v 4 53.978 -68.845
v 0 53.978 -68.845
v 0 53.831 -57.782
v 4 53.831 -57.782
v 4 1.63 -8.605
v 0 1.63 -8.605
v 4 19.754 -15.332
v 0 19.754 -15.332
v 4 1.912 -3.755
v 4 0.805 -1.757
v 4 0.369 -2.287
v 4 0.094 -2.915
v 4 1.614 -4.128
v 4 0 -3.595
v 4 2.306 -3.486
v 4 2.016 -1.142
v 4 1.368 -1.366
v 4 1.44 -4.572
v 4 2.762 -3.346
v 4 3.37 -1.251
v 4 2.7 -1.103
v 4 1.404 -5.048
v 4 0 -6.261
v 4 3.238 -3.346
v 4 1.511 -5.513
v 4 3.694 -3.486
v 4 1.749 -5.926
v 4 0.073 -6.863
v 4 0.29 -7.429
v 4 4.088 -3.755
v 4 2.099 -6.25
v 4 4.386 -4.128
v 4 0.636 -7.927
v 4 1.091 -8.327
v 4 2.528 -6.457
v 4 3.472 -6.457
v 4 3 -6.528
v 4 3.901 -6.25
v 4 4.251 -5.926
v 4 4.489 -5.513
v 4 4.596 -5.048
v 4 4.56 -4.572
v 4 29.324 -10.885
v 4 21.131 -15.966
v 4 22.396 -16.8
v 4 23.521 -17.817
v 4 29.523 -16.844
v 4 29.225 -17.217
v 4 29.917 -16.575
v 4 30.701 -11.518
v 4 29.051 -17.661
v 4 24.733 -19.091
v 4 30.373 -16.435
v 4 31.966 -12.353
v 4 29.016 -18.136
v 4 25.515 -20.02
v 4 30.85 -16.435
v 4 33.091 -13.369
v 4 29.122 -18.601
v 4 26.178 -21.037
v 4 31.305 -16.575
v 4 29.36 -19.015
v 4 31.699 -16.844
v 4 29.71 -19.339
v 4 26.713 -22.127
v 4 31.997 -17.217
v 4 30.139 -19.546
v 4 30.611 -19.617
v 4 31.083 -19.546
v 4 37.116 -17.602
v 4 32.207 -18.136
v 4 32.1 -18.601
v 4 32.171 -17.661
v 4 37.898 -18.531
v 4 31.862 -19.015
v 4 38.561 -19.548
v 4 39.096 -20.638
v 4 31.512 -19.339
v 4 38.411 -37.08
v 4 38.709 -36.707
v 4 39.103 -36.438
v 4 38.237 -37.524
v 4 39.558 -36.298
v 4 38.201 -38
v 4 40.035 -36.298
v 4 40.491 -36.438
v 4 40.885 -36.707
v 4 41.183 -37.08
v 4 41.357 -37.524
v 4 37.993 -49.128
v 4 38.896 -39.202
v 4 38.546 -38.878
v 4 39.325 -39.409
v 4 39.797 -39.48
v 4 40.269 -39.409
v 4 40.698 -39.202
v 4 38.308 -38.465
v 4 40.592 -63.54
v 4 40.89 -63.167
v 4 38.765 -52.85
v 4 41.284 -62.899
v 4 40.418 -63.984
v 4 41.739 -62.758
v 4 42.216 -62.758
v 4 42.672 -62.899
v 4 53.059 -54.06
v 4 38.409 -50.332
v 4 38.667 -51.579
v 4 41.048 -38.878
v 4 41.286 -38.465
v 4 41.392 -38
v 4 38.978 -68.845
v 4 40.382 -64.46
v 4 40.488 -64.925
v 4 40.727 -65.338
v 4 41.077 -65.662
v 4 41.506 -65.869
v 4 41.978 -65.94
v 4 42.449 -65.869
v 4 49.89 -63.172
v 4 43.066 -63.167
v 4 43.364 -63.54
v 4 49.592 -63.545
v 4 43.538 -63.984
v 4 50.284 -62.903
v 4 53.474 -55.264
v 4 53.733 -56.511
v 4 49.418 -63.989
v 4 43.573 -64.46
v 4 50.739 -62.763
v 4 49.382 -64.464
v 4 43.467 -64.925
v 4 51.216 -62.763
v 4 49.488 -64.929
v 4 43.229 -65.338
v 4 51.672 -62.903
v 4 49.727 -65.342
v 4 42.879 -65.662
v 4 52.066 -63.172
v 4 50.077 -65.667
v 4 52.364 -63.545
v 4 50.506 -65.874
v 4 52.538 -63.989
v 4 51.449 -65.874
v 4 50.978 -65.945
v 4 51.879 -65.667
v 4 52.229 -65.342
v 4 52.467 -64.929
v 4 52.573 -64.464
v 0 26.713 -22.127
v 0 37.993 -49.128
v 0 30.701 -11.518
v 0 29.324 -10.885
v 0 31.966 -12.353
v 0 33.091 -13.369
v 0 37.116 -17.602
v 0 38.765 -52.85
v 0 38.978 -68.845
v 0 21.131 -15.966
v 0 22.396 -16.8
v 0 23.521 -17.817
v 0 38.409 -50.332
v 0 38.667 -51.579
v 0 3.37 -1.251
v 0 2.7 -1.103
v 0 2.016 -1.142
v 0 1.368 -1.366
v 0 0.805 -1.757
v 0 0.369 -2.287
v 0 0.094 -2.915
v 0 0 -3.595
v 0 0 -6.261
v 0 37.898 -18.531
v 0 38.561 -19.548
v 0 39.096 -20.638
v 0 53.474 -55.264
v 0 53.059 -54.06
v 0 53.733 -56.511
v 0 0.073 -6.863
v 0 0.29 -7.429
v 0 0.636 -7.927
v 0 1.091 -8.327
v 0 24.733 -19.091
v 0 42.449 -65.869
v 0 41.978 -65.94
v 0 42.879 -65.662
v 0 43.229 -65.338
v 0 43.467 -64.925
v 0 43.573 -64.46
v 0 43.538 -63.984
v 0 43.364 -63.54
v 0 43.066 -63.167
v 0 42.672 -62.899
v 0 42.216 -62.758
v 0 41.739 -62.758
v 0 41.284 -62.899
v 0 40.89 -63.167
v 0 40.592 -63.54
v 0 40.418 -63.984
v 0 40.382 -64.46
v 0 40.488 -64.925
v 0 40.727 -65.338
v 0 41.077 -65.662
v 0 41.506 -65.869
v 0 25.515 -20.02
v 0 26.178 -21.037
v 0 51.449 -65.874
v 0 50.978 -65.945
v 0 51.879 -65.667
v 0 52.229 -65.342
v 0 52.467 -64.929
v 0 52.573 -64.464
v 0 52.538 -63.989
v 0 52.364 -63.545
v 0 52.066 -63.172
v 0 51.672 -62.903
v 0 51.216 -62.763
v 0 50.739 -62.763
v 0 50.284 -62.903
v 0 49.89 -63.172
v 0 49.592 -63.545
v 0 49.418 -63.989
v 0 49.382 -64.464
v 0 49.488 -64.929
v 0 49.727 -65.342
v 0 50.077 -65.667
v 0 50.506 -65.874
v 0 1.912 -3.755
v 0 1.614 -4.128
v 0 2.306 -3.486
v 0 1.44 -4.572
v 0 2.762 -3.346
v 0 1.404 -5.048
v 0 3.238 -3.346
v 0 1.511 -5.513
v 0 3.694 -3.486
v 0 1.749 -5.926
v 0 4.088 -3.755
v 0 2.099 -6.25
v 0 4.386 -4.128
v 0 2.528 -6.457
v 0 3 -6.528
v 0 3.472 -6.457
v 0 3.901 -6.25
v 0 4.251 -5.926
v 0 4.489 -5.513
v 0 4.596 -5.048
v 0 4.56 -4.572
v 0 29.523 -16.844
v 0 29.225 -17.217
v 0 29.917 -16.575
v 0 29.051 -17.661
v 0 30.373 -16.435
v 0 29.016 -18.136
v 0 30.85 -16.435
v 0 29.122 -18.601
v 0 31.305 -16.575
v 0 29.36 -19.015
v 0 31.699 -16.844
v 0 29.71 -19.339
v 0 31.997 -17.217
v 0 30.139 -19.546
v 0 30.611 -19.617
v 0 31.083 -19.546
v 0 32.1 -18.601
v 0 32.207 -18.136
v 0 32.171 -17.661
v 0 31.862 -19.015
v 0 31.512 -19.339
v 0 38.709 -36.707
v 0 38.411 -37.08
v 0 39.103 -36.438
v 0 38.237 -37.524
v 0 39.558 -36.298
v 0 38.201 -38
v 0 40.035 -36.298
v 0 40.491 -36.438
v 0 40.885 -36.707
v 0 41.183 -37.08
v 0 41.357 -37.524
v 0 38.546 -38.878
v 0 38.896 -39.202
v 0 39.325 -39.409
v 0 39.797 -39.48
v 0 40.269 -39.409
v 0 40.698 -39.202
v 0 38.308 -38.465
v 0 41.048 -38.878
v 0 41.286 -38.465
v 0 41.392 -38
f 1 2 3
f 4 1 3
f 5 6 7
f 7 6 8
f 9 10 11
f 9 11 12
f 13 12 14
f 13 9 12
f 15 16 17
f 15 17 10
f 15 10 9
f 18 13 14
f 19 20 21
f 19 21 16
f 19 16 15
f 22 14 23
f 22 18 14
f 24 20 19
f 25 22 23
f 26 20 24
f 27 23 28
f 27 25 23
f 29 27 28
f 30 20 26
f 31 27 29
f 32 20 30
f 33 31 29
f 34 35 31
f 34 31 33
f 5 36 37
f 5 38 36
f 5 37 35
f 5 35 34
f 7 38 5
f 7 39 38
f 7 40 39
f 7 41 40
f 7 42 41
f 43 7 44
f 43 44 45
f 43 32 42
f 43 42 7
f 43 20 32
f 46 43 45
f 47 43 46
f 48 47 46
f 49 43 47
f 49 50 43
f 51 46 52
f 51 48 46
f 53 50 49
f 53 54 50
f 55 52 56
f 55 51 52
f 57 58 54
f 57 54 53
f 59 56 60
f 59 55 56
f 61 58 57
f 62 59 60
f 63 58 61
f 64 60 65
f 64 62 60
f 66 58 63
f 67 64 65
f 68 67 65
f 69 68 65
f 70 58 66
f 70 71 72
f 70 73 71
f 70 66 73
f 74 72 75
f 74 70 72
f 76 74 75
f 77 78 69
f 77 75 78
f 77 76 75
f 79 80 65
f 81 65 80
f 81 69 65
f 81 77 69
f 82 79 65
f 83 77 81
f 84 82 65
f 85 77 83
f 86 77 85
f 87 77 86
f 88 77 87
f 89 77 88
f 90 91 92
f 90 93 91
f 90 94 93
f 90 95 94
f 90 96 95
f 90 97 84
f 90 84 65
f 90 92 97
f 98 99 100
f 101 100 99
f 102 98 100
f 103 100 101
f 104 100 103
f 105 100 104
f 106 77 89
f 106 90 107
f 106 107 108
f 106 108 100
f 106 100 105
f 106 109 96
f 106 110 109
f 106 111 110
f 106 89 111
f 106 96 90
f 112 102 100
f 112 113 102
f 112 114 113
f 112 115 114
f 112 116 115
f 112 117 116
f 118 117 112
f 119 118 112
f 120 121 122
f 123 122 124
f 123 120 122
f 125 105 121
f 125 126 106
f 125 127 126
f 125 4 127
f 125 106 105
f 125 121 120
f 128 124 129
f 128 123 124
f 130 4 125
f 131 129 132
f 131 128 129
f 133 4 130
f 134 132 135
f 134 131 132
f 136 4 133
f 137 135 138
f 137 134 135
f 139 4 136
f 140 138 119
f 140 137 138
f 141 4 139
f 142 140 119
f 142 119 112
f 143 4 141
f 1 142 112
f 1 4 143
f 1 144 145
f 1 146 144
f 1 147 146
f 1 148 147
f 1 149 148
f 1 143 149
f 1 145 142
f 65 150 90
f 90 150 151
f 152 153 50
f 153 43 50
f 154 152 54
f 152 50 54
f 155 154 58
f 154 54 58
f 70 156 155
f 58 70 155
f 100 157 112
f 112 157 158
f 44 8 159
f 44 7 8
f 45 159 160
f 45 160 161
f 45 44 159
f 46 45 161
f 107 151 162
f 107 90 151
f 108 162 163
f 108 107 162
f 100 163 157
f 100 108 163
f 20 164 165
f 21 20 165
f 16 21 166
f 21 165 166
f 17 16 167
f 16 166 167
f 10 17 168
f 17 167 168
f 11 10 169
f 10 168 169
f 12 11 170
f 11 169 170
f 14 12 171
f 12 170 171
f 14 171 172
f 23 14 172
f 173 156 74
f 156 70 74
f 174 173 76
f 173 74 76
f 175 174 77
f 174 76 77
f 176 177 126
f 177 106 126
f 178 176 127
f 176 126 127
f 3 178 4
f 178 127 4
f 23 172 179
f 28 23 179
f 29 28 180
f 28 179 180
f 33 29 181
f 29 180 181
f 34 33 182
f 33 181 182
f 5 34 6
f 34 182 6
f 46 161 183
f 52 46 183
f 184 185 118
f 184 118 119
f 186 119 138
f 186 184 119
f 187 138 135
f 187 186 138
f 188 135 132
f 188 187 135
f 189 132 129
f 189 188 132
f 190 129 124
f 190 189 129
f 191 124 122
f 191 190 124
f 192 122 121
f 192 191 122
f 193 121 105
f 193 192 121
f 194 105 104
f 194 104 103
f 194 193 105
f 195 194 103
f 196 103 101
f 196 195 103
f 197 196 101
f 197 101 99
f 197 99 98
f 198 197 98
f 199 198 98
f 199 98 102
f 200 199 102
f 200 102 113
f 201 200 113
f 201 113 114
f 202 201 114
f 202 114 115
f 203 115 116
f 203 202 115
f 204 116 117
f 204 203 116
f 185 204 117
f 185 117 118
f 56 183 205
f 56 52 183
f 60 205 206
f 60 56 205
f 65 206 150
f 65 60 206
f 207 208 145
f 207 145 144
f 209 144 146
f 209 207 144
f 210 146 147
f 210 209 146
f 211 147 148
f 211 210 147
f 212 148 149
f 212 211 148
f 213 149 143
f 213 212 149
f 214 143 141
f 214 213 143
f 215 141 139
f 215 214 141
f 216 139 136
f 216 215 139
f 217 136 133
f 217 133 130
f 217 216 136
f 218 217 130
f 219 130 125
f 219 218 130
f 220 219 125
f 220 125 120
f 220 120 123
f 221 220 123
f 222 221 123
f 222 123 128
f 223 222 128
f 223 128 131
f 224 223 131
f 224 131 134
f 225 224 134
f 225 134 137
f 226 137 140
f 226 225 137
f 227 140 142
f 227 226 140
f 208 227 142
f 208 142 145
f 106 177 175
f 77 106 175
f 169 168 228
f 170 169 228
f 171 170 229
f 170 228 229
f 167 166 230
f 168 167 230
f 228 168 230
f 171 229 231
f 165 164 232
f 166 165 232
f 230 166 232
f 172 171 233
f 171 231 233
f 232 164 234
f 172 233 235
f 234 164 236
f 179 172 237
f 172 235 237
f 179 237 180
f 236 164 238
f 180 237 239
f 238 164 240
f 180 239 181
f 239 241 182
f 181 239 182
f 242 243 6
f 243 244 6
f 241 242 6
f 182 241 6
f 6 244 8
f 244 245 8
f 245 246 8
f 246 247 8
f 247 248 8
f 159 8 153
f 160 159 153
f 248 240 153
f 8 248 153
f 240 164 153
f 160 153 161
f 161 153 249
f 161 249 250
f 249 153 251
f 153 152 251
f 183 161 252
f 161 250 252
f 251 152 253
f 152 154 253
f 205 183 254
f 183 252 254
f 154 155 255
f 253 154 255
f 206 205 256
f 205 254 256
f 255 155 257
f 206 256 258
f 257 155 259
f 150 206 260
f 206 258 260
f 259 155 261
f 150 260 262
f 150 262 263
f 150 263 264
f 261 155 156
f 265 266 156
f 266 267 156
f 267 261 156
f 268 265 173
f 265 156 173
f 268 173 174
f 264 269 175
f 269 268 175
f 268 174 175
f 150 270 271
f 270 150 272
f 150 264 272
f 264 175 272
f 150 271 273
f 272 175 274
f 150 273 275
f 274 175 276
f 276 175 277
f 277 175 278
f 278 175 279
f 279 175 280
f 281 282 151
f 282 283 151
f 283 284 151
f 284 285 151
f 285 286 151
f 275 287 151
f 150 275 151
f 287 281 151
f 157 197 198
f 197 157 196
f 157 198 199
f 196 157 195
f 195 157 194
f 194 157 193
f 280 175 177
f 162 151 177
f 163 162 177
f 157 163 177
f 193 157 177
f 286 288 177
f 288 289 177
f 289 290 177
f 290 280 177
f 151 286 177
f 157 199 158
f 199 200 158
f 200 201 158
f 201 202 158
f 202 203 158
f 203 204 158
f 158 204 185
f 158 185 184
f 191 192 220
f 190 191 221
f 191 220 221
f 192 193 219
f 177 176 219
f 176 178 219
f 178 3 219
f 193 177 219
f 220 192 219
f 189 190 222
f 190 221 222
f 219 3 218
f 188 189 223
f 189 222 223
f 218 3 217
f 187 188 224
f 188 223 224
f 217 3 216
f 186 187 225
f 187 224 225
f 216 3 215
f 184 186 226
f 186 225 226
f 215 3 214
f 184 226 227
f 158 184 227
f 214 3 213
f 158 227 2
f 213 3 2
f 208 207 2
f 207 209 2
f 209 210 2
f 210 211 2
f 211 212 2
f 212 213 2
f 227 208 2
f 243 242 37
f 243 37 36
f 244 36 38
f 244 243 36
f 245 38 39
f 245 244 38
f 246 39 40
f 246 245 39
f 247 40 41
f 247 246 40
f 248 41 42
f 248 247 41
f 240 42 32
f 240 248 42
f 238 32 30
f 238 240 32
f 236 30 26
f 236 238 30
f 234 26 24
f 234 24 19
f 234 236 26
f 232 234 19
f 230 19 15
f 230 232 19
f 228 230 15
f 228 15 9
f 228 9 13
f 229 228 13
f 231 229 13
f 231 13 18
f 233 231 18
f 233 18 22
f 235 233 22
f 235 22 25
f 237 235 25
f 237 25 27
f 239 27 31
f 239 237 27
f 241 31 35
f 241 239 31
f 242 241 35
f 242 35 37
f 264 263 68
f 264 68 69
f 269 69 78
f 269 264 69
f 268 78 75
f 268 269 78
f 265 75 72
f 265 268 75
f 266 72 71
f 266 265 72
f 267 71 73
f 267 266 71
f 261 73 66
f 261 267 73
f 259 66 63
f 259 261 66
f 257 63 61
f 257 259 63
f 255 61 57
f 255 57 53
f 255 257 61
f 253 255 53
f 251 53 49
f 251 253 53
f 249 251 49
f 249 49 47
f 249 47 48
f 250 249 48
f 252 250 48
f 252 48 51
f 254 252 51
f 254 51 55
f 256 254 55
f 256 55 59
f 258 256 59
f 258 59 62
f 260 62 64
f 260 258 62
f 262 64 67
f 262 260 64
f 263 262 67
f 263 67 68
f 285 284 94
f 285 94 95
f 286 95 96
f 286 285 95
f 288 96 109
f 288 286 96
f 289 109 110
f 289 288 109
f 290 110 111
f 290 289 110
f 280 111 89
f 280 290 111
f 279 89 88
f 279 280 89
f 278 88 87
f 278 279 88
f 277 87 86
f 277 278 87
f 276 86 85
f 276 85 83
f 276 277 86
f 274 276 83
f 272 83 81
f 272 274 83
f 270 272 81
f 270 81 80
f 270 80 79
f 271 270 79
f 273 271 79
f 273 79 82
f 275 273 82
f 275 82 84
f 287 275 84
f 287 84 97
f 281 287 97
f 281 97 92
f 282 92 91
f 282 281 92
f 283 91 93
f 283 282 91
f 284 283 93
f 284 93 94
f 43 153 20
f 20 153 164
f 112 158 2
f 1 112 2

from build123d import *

# Parameters (mm, degrees)
SKETCH1_R           = 1.6
BOSS_EXTRUDE1_DEPTH = 4
FILLET1_R           = 10


with BuildPart() as part:
    # Sketch1 → Boss-Extrude1 (new body)
    with BuildSketch(Plane(origin=(0, 0, 0), x_dir=(0, 0, -1), z_dir=(1, 0, 0))):
        with BuildLine():
            Line((3.594627394, 0), (6.26129406, 0))
            ThreePointArc((6.26129406, 0), (7.688720424, 0.447573637), (8.60504406, 1.630036818))
            Line((8.60504406, 1.630036818), (16.138282763, 21.925181005))
            Line((16.138282763, 21.925181005), (20.42668985, 26.002896629))
            Line((20.42668985, 26.002896629), (50.91386883, 38.739566173))
            Line((50.91386883, 38.739566173), (68.844719883, 38.977888478))
            Line((68.844719883, 38.977888478), (68.844719883, 53.977888478))
            Line((68.844719883, 53.977888478), (55.845867993, 53.805118299))
            Line((55.845867993, 53.805118299), (18.937282625, 38.385769218))
            Line((18.937282625, 38.385769218), (11.690435574, 31.494963182))
            Line((11.690435574, 31.494963182), (1.250877394, 3.369963182))
            ThreePointArc((1.250877394, 3.369963182), (1.54220103, 1.072573637), (3.594627394, 0))
        make_face()
        with Locations((64.344719883, 50.977888478)):
            Circle(SKETCH1_R, mode=Mode.SUBTRACT)
        with Locations((4.927960727, 3)):
            Circle(SKETCH1_R, mode=Mode.SUBTRACT)
        with Locations((18.016916415, 30.611068767)):
            Circle(SKETCH1_R, mode=Mode.SUBTRACT)
        with Locations((37.879973994, 39.796930611)):
            Circle(SKETCH1_R, mode=Mode.SUBTRACT)
        with Locations((64.340323045, 41.977889552)):
            Circle(SKETCH1_R, mode=Mode.SUBTRACT)
    extrude(amount=BOSS_EXTRUDE1_DEPTH)

    # Fillet1
    fillet1_edges = [part.edges().sort_by_distance(p)[0] for p in [
        (2, 21.925181005, -16.138282763),
        (2, 26.002896629, -20.42668985),
        (2, 38.739566173, -50.91386883),
        (2, 53.805118299, -55.845867993),
        (2, 38.385769218, -18.937282625),
        (2, 31.494963182, -11.690435574),
    ]]
    fillet(fillet1_edges, radius=FILLET1_R)


solid = part.part
